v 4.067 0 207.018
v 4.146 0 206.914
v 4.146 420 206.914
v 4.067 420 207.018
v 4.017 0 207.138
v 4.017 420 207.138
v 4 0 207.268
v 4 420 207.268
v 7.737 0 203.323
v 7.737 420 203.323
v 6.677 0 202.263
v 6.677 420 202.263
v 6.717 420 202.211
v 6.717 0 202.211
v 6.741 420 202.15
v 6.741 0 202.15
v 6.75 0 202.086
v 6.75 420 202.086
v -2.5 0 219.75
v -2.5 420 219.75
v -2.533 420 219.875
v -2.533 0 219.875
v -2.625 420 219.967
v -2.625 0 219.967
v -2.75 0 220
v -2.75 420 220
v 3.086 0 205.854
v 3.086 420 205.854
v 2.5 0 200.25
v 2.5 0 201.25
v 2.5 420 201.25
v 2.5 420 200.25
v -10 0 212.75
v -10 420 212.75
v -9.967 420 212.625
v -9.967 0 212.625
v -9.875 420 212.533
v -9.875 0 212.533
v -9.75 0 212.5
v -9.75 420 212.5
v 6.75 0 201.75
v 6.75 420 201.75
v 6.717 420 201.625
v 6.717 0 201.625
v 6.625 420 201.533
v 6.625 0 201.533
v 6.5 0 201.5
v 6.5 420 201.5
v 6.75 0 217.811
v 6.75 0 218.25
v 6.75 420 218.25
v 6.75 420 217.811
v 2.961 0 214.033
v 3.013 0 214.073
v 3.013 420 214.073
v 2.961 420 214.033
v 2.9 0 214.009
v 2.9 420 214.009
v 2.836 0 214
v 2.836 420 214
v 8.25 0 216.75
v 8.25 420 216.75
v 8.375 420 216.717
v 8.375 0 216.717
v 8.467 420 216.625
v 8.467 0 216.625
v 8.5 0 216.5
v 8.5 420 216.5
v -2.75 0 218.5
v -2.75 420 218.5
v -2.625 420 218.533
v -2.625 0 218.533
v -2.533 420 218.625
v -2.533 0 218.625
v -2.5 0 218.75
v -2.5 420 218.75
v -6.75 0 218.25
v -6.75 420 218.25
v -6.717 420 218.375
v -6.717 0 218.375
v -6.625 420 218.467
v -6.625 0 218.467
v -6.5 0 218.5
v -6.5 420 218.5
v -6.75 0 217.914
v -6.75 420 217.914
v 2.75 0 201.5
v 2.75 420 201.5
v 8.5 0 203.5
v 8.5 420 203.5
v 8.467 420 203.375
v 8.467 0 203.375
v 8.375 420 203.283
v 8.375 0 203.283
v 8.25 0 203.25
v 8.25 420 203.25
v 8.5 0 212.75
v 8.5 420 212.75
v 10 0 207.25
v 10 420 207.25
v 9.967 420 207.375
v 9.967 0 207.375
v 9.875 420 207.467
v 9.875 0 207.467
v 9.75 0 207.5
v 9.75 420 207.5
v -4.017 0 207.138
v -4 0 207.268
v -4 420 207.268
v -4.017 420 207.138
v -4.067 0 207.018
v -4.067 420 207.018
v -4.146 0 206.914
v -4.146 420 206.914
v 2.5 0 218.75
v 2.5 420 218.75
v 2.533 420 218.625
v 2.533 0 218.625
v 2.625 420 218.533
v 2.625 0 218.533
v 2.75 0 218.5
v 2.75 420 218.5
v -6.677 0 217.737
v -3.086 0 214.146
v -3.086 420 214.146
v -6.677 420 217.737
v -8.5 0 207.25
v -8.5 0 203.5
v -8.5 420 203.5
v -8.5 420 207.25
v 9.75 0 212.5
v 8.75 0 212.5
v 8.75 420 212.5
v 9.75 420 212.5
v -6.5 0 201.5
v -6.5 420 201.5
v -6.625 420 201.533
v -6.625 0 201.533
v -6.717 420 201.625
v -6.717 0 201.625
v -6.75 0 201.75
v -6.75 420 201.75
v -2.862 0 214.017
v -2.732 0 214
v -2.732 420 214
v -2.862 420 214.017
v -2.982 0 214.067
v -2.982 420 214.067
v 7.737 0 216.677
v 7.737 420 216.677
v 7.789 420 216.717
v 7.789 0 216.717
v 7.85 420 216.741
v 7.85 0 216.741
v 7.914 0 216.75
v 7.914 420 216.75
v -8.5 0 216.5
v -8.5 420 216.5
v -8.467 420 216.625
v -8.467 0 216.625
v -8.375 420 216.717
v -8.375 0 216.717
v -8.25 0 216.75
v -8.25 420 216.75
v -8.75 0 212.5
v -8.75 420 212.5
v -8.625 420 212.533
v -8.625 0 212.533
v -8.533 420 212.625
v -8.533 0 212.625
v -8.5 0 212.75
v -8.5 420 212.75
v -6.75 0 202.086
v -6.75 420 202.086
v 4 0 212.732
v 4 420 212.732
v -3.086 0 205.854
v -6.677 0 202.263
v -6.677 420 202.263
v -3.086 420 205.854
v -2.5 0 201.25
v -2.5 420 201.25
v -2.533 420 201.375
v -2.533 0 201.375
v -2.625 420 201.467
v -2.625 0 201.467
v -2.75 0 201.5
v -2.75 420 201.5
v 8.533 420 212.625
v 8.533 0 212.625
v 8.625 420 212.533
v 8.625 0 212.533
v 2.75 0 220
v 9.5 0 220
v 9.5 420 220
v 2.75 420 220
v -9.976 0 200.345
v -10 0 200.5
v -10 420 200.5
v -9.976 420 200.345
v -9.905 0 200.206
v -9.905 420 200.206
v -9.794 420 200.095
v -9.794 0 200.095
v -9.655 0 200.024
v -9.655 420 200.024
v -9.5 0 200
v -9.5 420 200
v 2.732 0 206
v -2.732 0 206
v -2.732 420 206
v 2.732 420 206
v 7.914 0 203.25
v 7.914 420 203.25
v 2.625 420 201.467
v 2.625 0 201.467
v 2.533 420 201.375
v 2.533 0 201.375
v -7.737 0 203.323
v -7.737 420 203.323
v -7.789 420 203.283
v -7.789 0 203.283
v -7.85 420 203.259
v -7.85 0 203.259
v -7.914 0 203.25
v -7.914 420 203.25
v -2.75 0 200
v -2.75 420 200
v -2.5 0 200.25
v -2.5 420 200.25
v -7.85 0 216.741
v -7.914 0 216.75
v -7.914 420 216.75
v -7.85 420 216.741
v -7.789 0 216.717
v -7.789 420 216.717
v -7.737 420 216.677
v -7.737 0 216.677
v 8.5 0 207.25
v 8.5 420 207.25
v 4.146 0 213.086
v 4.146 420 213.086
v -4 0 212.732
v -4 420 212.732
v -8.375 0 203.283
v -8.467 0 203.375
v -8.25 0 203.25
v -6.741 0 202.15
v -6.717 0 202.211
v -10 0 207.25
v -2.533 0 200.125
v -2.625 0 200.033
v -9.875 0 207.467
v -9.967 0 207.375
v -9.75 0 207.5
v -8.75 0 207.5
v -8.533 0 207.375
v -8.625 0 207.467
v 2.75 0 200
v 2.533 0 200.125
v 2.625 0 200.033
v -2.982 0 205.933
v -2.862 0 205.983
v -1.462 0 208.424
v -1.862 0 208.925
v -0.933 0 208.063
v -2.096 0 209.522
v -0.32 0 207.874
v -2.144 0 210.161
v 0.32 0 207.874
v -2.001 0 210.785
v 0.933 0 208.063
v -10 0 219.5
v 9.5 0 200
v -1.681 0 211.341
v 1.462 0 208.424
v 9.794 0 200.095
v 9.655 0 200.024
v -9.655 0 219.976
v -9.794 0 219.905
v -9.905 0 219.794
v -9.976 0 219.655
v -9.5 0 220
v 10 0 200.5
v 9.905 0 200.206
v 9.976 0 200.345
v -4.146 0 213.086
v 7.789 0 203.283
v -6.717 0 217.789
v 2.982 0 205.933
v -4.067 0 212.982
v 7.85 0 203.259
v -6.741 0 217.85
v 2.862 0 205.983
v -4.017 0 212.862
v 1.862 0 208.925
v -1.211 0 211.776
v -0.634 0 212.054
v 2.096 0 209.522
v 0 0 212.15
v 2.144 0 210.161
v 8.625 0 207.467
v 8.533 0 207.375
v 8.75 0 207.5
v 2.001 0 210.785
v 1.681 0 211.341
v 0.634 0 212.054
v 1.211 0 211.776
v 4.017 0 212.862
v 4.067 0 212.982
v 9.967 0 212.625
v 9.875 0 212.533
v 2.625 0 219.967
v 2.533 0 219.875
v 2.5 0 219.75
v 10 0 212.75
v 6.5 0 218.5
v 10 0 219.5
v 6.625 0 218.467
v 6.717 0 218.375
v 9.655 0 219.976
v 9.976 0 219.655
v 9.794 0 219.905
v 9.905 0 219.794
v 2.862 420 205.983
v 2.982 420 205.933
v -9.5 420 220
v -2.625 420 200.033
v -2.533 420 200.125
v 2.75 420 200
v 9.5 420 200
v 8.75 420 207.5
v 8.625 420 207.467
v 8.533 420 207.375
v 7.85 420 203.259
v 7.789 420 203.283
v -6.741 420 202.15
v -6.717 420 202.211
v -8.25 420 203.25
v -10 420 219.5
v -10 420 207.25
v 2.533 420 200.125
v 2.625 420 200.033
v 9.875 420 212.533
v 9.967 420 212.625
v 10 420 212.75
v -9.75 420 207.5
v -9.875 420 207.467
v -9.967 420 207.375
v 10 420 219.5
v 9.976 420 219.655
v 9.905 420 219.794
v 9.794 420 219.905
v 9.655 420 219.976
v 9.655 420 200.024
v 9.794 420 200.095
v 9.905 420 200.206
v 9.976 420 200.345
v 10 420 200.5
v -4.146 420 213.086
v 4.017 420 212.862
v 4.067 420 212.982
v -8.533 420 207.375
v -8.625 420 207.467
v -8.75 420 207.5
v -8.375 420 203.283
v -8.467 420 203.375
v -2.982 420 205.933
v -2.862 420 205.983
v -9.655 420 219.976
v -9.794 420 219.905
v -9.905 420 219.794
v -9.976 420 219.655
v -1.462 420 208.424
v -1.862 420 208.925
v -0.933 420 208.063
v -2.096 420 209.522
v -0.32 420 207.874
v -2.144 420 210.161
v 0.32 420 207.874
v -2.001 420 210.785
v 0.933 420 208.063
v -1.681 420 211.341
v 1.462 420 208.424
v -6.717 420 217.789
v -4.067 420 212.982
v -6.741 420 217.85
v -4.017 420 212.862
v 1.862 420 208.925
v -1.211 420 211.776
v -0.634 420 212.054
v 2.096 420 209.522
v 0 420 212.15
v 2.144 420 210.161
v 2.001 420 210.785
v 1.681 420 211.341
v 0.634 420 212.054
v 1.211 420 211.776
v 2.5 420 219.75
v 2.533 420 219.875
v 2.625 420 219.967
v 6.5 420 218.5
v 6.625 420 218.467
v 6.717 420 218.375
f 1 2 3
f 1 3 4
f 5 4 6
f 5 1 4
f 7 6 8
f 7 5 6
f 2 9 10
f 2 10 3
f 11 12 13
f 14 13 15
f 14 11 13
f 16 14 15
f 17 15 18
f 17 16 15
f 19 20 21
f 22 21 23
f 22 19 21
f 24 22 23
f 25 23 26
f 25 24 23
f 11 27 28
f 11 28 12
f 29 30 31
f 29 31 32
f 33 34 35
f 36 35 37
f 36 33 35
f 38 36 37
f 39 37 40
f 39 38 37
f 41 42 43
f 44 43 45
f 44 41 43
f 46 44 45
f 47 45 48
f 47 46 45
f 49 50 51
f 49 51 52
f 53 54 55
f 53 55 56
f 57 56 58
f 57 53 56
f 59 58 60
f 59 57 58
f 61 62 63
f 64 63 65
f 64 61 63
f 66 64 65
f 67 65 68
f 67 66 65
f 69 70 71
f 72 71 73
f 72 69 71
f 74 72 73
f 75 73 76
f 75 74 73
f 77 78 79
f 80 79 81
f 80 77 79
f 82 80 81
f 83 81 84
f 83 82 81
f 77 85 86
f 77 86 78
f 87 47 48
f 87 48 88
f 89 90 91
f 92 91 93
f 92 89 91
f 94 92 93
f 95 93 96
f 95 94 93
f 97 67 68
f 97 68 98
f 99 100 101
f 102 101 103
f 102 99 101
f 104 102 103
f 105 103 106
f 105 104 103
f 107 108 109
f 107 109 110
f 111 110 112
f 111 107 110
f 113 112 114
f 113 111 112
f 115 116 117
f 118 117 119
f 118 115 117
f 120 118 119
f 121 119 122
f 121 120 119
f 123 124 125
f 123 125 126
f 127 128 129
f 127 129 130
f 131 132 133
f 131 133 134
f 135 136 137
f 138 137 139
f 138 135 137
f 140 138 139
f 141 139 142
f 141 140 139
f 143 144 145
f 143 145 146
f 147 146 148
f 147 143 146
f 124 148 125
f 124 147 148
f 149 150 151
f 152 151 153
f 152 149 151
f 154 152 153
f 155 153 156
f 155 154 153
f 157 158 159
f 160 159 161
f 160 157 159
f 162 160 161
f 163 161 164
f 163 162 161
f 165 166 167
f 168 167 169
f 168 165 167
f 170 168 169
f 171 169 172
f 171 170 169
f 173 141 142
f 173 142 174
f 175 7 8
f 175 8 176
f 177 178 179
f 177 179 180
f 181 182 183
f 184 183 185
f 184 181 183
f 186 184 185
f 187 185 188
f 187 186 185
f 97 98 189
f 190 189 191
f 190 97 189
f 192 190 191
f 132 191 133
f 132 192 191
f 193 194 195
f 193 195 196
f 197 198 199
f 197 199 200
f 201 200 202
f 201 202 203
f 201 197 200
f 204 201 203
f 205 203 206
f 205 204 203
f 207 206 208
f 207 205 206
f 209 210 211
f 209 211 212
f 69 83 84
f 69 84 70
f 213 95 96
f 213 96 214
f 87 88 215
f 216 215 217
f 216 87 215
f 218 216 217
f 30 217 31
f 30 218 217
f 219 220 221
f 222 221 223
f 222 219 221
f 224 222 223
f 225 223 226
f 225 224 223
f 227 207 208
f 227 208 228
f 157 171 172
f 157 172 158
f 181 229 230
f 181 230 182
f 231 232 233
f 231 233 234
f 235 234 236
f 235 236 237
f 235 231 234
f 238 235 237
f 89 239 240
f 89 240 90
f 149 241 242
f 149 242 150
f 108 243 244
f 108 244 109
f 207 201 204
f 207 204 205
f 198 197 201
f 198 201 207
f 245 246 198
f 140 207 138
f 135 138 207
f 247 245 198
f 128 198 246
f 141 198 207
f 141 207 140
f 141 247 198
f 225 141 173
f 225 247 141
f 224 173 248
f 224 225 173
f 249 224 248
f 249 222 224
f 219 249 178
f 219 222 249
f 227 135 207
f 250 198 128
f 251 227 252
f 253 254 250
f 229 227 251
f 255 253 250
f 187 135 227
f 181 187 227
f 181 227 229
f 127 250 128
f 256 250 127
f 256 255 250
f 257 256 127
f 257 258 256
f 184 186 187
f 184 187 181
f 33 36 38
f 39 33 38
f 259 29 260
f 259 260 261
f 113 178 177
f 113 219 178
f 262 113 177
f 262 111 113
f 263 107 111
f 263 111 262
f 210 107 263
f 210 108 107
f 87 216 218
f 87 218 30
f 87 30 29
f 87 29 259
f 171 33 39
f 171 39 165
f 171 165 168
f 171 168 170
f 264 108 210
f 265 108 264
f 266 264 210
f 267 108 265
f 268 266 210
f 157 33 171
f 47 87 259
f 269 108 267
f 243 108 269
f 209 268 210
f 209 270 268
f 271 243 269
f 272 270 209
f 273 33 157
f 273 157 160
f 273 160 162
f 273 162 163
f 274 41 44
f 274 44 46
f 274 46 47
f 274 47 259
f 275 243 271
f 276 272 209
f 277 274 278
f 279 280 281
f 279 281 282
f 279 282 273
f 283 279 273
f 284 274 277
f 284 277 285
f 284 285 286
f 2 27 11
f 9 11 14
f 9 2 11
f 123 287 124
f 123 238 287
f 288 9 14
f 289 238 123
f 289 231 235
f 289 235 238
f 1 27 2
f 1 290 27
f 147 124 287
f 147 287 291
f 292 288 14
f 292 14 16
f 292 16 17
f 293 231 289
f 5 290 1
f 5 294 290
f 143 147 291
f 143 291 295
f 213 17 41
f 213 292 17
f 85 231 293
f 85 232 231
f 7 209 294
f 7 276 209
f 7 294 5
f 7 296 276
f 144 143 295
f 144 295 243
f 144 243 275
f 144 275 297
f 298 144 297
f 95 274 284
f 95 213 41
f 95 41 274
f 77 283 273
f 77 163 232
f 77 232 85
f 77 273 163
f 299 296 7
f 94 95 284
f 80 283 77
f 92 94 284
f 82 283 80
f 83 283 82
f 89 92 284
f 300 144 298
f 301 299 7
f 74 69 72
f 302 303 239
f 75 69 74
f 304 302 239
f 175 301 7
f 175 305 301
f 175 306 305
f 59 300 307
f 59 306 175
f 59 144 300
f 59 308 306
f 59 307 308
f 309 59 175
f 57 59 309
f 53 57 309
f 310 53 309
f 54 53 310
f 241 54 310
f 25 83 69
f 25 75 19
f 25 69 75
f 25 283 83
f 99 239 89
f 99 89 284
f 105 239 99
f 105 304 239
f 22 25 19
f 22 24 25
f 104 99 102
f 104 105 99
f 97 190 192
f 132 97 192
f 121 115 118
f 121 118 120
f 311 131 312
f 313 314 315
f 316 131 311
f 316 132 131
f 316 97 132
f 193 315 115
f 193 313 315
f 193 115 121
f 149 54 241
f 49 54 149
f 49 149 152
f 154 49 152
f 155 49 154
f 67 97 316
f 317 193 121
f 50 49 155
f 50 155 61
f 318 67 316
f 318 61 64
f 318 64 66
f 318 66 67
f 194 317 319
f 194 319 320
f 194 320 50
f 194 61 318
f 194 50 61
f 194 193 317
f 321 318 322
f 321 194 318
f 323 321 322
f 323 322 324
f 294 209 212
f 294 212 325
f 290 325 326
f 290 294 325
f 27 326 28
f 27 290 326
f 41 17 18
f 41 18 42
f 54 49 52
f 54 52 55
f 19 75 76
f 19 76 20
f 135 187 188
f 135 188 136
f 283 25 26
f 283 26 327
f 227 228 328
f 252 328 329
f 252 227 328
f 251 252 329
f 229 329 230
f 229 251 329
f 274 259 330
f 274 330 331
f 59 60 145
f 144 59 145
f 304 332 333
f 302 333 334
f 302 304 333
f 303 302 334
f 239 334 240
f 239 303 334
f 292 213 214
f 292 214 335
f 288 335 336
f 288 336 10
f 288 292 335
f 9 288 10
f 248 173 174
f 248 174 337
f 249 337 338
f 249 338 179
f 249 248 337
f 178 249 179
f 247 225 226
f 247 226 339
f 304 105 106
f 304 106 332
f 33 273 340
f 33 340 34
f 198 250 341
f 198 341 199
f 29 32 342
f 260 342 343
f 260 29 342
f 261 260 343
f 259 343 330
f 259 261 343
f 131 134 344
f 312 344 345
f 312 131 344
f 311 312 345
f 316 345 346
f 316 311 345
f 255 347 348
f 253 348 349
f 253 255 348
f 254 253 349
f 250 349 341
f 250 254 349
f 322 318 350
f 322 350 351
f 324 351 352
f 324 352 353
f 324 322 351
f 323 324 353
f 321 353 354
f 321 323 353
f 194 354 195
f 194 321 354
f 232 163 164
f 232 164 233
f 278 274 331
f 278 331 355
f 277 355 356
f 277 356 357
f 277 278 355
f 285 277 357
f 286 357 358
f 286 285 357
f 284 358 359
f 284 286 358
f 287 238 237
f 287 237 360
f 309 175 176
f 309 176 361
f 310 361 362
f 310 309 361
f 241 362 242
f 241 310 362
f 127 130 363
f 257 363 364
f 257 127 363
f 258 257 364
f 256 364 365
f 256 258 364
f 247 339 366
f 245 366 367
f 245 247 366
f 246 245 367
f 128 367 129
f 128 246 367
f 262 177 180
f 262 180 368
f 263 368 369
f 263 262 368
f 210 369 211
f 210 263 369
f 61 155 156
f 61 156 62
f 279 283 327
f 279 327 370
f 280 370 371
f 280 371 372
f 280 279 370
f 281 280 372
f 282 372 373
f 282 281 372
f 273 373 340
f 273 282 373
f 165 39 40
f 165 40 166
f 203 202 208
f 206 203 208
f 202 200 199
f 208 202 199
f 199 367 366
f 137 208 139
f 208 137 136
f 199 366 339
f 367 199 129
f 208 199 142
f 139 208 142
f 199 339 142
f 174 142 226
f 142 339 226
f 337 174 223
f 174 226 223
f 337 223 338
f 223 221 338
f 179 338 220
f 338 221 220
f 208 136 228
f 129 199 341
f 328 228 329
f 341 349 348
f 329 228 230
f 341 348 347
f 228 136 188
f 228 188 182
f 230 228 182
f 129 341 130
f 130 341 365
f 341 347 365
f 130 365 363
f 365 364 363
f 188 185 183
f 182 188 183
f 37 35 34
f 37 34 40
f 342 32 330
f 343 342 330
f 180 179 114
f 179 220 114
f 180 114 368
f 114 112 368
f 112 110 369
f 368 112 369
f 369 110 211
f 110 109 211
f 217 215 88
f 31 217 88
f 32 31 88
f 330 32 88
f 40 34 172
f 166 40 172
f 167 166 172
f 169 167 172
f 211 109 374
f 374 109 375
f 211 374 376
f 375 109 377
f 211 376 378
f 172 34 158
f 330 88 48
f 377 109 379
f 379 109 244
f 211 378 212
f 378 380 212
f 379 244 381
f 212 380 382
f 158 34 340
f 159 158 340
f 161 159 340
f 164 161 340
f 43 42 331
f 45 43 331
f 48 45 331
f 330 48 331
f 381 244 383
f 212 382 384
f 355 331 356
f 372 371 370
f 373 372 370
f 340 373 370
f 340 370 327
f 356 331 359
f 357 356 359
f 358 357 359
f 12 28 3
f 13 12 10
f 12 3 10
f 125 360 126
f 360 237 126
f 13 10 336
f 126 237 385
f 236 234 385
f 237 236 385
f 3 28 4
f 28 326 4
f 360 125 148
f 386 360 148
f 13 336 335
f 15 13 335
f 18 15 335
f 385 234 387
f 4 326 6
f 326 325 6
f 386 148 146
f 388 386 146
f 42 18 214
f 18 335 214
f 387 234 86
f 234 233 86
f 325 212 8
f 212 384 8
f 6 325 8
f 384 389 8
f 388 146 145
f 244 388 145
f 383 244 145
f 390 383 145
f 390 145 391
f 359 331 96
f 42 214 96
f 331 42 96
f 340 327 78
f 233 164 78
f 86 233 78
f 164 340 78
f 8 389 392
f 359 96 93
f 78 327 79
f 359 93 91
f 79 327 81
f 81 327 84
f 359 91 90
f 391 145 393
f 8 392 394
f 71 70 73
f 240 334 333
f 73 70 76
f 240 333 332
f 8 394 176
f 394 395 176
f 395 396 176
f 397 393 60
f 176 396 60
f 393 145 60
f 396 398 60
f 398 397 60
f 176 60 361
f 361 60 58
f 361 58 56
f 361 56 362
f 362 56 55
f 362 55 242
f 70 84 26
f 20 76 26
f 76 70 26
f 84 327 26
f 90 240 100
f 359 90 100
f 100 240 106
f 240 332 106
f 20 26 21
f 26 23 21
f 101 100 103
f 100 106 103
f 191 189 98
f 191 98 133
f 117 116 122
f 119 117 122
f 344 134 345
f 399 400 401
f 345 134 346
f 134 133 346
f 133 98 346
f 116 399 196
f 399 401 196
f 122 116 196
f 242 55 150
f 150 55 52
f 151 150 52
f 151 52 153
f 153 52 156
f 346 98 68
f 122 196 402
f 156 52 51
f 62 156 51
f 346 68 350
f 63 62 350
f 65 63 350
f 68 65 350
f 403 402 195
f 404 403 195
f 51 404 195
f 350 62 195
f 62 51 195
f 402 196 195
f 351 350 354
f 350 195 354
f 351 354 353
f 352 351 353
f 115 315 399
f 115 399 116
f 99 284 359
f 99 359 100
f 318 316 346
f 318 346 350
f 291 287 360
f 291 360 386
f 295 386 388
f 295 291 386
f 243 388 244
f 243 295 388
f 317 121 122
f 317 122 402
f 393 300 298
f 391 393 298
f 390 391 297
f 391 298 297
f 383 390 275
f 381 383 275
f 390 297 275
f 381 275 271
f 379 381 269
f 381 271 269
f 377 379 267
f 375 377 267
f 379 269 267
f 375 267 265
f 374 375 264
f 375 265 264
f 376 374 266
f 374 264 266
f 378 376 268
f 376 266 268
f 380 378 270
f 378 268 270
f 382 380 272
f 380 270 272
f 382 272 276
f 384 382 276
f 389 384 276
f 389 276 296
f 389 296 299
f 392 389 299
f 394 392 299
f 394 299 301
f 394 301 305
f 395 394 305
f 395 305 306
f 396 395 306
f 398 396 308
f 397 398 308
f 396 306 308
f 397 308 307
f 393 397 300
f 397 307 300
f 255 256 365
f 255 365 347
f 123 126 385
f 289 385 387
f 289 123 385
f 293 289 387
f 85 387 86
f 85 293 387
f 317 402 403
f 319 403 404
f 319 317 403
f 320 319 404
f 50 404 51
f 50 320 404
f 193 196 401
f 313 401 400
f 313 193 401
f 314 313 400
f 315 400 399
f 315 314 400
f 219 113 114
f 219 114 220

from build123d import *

# Parameters (mm, degrees)
SKETCH_1_R      = 2.15
EXTRUDE_1_DEPTH = 420


with BuildPart() as part:
    # Эскиз1 → Бобышка-Вытянуть1 (new body)
    with BuildSketch(Plane(origin=(0, 0, 210), x_dir=(1, 0, 0), z_dir=(0, -1, 0))):
        with BuildLine():
            Line((-10, -2.75), (-10, -9.5))
            ThreePointArc((-10, -9.5), (-9.853553391, -9.853553391), (-9.5, -10))
            Line((-9.5, -10), (-2.75, -10))
            ThreePointArc((-2.75, -10), (-2.573223305, -9.926776695), (-2.5, -9.75))
            Line((-2.5, -9.75), (-2.5, -8.75))
            ThreePointArc((-2.5, -8.75), (-2.573223305, -8.573223305), (-2.75, -8.5))
            Line((-2.75, -8.5), (-6.5, -8.5))
            ThreePointArc((-6.5, -8.5), (-6.676776695, -8.426776695), (-6.75, -8.25))
            Line((-6.75, -8.25), (-6.75, -7.914213562))
            ThreePointArc((-6.75, -7.914213562), (-6.730969883, -7.818542704), (-6.676776695, -7.737436867))
            Line((-6.676776695, -7.737436867), (-3.085786438, -4.146446609))
            ThreePointArc((-3.085786438, -4.146446609), (-2.923574763, -4.038060234), (-2.732233047, -4))
            Line((-2.732233047, -4), (2.732233047, -4))
            ThreePointArc((2.732233047, -4), (2.923574763, -4.038060234), (3.085786438, -4.146446609))
            Line((3.085786438, -4.146446609), (6.676776695, -7.737436867))
            ThreePointArc((6.676776695, -7.737436867), (6.730969883, -7.818542704), (6.75, -7.914213562))
            Line((6.75, -7.914213562), (6.75, -8.25))
            ThreePointArc((6.75, -8.25), (6.676776695, -8.426776695), (6.5, -8.5))
            Line((6.5, -8.5), (2.75, -8.5))
            ThreePointArc((2.75, -8.5), (2.573223305, -8.573223305), (2.5, -8.75))
            Line((2.5, -8.75), (2.5, -9.75))
            ThreePointArc((2.5, -9.75), (2.573223305, -9.926776695), (2.75, -10))
            Line((2.75, -10), (9.5, -10))
            ThreePointArc((9.5, -10), (9.853553391, -9.853553391), (10, -9.5))
            Line((10, -9.5), (10, -2.75))
            ThreePointArc((10, -2.75), (9.926776695, -2.573223305), (9.75, -2.5))
            Line((9.75, -2.5), (8.75, -2.5))
            ThreePointArc((8.75, -2.5), (8.573223305, -2.573223305), (8.5, -2.75))
            Line((8.5, -2.75), (8.5, -6.5))
            ThreePointArc((8.5, -6.5), (8.426776695, -6.676776695), (8.25, -6.75))
            Line((8.25, -6.75), (7.914213562, -6.75))
            ThreePointArc((7.914213562, -6.75), (7.818542704, -6.730969883), (7.737436867, -6.676776695))
            Line((7.737436867, -6.676776695), (4.146446609, -3.085786438))
            ThreePointArc((4.146446609, -3.085786438), (4.038060234, -2.923574763), (4, -2.732233047))
            Line((4, -2.732233047), (4, 2.732233047))
            ThreePointArc((4, 2.732233047), (4.038060234, 2.923574763), (4.146446609, 3.085786438))
            Line((4.146446609, 3.085786438), (7.737436867, 6.676776695))
            ThreePointArc((7.737436867, 6.676776695), (7.818542704, 6.730969883), (7.914213562, 6.75))
            Line((7.914213562, 6.75), (8.25, 6.75))
            ThreePointArc((8.25, 6.75), (8.426776695, 6.676776695), (8.5, 6.5))
            Line((8.5, 6.5), (8.5, 2.75))
            ThreePointArc((8.5, 2.75), (8.573223305, 2.573223305), (8.75, 2.5))
            Line((8.75, 2.5), (9.75, 2.5))
            ThreePointArc((9.75, 2.5), (9.926776695, 2.573223305), (10, 2.75))
            Line((10, 2.75), (10, 9.5))
            ThreePointArc((10, 9.5), (9.853553391, 9.853553391), (9.5, 10))
            Line((9.5, 10), (2.75, 10))
            ThreePointArc((2.75, 10), (2.573223305, 9.926776695), (2.5, 9.75))
            Line((2.5, 9.75), (2.5, 8.75))
            ThreePointArc((2.5, 8.75), (2.573223305, 8.573223305), (2.75, 8.5))
            Line((2.75, 8.5), (6.5, 8.5))
            ThreePointArc((6.5, 8.5), (6.676776695, 8.426776695), (6.75, 8.25))
            Line((6.75, 8.25), (6.75, 7.810660172))
            Line((6.75, 7.810660172), (3.012563133, 4.073223305))
            ThreePointArc((3.012563133, 4.073223305), (2.931457296, 4.019030117), (2.835786438, 4))
            Line((2.835786438, 4), (-2.732233047, 4))
            ThreePointArc((-2.732233047, 4), (-2.923574763, 4.038060234), (-3.085786438, 4.146446609))
            Line((-3.085786438, 4.146446609), (-6.676776695, 7.737436867))
            ThreePointArc((-6.676776695, 7.737436867), (-6.730969883, 7.818542704), (-6.75, 7.914213562))
            Line((-6.75, 7.914213562), (-6.75, 8.25))
            ThreePointArc((-6.75, 8.25), (-6.676776695, 8.426776695), (-6.5, 8.5))
            Line((-6.5, 8.5), (-2.75, 8.5))
            ThreePointArc((-2.75, 8.5), (-2.573223305, 8.573223305), (-2.5, 8.75))
            Line((-2.5, 8.75), (-2.5, 9.75))
            ThreePointArc((-2.5, 9.75), (-2.573223305, 9.926776695), (-2.75, 10))
            Line((-2.75, 10), (-9.5, 10))
            ThreePointArc((-9.5, 10), (-9.853553391, 9.853553391), (-10, 9.5))
            Line((-10, 9.5), (-10, 2.75))
            ThreePointArc((-10, 2.75), (-9.926776695, 2.573223305), (-9.75, 2.5))
            Line((-9.75, 2.5), (-8.75, 2.5))
            ThreePointArc((-8.75, 2.5), (-8.573223305, 2.573223305), (-8.5, 2.75))
            Line((-8.5, 2.75), (-8.5, 6.5))
            ThreePointArc((-8.5, 6.5), (-8.426776695, 6.676776695), (-8.25, 6.75))
            Line((-8.25, 6.75), (-7.914213562, 6.75))
            ThreePointArc((-7.914213562, 6.75), (-7.818542704, 6.730969883), (-7.737436867, 6.676776695))
            Line((-7.737436867, 6.676776695), (-4.146446609, 3.085786438))
            ThreePointArc((-4.146446609, 3.085786438), (-4.038060234, 2.923574763), (-4, 2.732233047))
            Line((-4, 2.732233047), (-4, -2.732233047))
            ThreePointArc((-4, -2.732233047), (-4.038060234, -2.923574763), (-4.146446609, -3.085786438))
            Line((-4.146446609, -3.085786438), (-7.737436867, -6.676776695))
            ThreePointArc((-7.737436867, -6.676776695), (-7.818542704, -6.730969883), (-7.914213562, -6.75))
            Line((-7.914213562, -6.75), (-8.25, -6.75))
            ThreePointArc((-8.25, -6.75), (-8.426776695, -6.676776695), (-8.5, -6.5))
            Line((-8.5, -6.5), (-8.5, -2.75))
            ThreePointArc((-8.5, -2.75), (-8.573223305, -2.573223305), (-8.75, -2.5))
            Line((-8.75, -2.5), (-9.75, -2.5))
            ThreePointArc((-9.75, -2.5), (-9.926776695, -2.573223305), (-10, -2.75))
        make_face()
        with Locations(Location((0, 0, 0), (0, 0, 90))):
            Circle(SKETCH_1_R, mode=Mode.SUBTRACT)
    extrude(amount=-EXTRUDE_1_DEPTH)


solid = part.part
